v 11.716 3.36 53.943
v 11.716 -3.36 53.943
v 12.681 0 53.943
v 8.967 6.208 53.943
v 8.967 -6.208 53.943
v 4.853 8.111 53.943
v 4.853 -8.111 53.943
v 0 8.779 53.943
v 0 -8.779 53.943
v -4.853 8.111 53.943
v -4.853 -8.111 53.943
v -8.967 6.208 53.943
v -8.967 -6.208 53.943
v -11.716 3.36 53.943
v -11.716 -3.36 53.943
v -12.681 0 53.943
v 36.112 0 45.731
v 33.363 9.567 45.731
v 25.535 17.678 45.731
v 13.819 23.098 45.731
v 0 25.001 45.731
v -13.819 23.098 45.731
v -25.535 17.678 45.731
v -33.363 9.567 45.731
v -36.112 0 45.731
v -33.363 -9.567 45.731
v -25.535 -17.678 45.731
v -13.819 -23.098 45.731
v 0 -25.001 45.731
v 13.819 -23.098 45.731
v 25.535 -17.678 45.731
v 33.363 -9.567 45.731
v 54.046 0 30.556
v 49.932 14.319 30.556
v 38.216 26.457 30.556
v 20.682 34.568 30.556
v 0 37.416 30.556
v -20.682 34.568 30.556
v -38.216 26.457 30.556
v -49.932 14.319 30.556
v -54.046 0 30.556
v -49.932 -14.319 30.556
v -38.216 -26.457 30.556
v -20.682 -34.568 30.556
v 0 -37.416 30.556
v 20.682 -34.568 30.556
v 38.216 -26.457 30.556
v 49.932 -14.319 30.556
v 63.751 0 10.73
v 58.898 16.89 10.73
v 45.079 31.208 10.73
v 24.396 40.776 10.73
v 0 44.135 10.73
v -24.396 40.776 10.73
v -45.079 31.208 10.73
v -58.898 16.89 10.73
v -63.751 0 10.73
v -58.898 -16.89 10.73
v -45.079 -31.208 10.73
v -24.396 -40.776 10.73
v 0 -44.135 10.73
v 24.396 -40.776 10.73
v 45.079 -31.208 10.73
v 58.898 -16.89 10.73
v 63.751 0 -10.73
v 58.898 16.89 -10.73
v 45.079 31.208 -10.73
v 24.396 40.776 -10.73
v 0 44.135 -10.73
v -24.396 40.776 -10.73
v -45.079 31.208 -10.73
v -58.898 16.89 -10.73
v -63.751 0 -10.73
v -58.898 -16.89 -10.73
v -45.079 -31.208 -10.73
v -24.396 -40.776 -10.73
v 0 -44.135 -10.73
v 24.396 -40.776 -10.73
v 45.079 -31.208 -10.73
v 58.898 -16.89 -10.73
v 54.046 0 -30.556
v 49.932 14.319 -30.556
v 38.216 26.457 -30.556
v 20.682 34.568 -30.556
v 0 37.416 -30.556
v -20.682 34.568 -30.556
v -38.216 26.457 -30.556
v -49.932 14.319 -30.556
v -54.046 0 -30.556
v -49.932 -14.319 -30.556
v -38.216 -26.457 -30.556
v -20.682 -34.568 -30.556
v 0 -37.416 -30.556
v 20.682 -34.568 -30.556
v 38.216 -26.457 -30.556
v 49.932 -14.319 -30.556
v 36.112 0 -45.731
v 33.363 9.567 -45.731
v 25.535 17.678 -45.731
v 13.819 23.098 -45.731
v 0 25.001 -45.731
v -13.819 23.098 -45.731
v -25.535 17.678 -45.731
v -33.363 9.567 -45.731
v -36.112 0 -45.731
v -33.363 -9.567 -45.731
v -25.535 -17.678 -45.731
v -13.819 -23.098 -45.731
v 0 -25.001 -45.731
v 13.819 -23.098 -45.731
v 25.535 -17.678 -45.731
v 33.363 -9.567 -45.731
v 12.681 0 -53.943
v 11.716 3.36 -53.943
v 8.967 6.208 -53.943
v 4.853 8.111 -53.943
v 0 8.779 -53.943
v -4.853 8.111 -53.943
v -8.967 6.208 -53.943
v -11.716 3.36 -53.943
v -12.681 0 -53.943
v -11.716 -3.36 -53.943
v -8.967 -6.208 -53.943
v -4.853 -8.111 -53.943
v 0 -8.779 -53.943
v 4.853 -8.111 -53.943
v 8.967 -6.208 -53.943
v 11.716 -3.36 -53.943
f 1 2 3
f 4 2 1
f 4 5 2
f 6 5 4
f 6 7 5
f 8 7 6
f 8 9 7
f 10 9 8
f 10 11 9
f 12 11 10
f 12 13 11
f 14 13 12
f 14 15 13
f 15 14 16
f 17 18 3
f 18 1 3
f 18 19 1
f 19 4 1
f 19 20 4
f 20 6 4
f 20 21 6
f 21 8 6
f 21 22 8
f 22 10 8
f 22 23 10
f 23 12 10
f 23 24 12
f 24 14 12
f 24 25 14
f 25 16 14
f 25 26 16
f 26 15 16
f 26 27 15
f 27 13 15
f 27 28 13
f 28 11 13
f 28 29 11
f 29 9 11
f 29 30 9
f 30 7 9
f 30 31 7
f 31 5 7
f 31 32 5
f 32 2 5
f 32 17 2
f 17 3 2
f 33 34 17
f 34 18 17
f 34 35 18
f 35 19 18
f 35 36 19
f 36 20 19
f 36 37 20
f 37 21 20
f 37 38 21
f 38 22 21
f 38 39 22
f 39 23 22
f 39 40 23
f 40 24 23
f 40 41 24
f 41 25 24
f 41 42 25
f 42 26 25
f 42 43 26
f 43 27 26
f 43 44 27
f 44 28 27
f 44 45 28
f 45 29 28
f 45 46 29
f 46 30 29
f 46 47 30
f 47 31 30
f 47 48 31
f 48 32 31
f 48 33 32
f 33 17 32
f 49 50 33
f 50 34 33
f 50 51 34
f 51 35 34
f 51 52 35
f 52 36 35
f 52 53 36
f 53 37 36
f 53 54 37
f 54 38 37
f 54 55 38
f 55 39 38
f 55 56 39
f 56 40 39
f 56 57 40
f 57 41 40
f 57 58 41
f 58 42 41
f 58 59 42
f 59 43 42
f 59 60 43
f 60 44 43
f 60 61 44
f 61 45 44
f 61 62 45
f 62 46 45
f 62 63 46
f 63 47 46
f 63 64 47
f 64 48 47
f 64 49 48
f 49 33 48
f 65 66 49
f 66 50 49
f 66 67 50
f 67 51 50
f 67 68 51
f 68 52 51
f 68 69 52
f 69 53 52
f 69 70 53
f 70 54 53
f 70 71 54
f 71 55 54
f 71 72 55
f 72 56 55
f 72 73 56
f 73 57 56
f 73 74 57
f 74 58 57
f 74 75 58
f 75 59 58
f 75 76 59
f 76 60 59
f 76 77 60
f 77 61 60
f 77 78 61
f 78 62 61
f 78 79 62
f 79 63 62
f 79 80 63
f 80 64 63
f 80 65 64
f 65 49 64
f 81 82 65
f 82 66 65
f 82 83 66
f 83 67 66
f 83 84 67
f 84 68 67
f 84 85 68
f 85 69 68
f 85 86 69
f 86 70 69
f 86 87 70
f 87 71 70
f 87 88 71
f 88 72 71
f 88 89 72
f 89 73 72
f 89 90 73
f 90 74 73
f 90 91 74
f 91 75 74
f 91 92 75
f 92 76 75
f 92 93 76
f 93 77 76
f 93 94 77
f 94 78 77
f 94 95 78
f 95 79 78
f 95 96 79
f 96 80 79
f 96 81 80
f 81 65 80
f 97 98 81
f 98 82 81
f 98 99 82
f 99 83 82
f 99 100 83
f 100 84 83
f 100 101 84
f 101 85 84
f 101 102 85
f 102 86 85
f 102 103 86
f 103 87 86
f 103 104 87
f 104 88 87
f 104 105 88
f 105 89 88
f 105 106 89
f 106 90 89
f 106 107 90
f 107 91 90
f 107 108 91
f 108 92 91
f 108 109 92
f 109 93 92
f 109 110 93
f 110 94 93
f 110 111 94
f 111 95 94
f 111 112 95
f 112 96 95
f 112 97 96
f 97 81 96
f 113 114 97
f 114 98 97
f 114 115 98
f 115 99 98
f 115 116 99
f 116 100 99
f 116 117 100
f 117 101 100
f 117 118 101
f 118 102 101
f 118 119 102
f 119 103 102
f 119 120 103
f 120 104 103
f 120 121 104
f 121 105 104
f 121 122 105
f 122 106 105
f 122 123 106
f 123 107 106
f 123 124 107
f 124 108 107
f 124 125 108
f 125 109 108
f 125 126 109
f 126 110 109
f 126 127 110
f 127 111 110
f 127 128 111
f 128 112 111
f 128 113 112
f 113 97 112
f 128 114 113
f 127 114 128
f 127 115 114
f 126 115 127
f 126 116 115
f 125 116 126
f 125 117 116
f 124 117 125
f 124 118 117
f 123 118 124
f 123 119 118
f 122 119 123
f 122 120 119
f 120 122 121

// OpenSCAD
// Generated by SolidPython 1.0.1 on 2020-07-29 00:46:50


scale(v = [13, 9, 11]) {
	sphere(r = 5);
}
/***********************************************
*********      SolidPython code:      **********
************************************************
 
# import packages: SolidPython
from solid import *
from solid.utils import *
from itertools import chain, combinations, permutations


class Resize:

    def __init__(self, scad_file):
        self.scad_file = scad_file
        #self.scad_file = import_scad(scad_file)
        # cone/cylinder param:
        self.r1 = 0
        self.r2 = 0
        self.h = 0
        # rectangular prism param:
        self.w = 0
        self.l = 0
        # ellipse param:
        self.r = 0

    # import OpenScad code (file name corresponds to shape)


    # classify shape + parameters
    def assign(self, param1, param2, param3):
        if self.scad_file == 'cone.scad':
            self.r1 = param1
            self.r2 = param2
            self.h = param3
        elif self.scad_file == 'cylinder.scad':
            self.r1 = param1
            self.r2 = param2
            self.h = param3
        elif self.scad_file == 'rectangularPrism.scad':
            self.h = param1
            self.l = param2
            self.w = param3
        else:
            self.r = param1
            self.h = param2

    # resize parameters
    def iterate(self):
        x = range(3, 20, 2)
        i = 1
        if self.scad_file == 'cone.scad':
            tempList = list(permutations(x, 2))
            for temp in tempList:
                param1 = temp[0]
                param2 = temp[1]
                filepath = 'produced_scad_files/' + 'cone' + str(param1) + '_' + str(param2) + '_' + '.scad'
                scad_render_to_file(cylinder(h=param1, r1=param2, r2=0), filepath)

        elif self.scad_file == 'cylinder.scad':
            tempList = list(permutations(x, 3))
            for temp in tempList:
                param1 = temp[0]
                param2 = temp[1]
                filepath = 'produced_scad_files/' + 'cylinder' + str(param1) + '_' + str(param2) + '_' + '.scad'
                scad_render_to_file(cylinder(h=param1, r1=param2, r2=param2), filepath)

        elif self.scad_file == 'rectangularPrism.scad':
            tempList = list(permutations(x, 3))
            for temp in tempList:
                param1 = temp[0]
                param2 = temp[1]
                param3 = temp[2]
                filepath = 'produced_scad_files/' + 'rectangularPrism' + str(param1) + '_' + str(param2) + '_' + str(
                    param3) + '.scad'
                scad_render_to_file(cube(size=(param1, param2, param3)), filepath)

        elif self.scad_file == 'ellipse.scad':
            tempList = list(permutations(x, 4))
            for temp in tempList:
                param1 = temp[0]
                param2 = temp[1]
                param3 = temp[2]
                param4 = temp[3]
                filepath = 'produced_scad_files/' + 'ellipse' + str(param1) + '_' + str(param2) + '_' + str(param3) + '_' + str(param4) + '.scad'
                scad_render_to_file(scale([param1, param2, param3])(sphere(r=param4)), filepath)

    def render_to_scadfile(self):
        scad_render_to_file(scad, 'example.scad') 
 
************************************************/
